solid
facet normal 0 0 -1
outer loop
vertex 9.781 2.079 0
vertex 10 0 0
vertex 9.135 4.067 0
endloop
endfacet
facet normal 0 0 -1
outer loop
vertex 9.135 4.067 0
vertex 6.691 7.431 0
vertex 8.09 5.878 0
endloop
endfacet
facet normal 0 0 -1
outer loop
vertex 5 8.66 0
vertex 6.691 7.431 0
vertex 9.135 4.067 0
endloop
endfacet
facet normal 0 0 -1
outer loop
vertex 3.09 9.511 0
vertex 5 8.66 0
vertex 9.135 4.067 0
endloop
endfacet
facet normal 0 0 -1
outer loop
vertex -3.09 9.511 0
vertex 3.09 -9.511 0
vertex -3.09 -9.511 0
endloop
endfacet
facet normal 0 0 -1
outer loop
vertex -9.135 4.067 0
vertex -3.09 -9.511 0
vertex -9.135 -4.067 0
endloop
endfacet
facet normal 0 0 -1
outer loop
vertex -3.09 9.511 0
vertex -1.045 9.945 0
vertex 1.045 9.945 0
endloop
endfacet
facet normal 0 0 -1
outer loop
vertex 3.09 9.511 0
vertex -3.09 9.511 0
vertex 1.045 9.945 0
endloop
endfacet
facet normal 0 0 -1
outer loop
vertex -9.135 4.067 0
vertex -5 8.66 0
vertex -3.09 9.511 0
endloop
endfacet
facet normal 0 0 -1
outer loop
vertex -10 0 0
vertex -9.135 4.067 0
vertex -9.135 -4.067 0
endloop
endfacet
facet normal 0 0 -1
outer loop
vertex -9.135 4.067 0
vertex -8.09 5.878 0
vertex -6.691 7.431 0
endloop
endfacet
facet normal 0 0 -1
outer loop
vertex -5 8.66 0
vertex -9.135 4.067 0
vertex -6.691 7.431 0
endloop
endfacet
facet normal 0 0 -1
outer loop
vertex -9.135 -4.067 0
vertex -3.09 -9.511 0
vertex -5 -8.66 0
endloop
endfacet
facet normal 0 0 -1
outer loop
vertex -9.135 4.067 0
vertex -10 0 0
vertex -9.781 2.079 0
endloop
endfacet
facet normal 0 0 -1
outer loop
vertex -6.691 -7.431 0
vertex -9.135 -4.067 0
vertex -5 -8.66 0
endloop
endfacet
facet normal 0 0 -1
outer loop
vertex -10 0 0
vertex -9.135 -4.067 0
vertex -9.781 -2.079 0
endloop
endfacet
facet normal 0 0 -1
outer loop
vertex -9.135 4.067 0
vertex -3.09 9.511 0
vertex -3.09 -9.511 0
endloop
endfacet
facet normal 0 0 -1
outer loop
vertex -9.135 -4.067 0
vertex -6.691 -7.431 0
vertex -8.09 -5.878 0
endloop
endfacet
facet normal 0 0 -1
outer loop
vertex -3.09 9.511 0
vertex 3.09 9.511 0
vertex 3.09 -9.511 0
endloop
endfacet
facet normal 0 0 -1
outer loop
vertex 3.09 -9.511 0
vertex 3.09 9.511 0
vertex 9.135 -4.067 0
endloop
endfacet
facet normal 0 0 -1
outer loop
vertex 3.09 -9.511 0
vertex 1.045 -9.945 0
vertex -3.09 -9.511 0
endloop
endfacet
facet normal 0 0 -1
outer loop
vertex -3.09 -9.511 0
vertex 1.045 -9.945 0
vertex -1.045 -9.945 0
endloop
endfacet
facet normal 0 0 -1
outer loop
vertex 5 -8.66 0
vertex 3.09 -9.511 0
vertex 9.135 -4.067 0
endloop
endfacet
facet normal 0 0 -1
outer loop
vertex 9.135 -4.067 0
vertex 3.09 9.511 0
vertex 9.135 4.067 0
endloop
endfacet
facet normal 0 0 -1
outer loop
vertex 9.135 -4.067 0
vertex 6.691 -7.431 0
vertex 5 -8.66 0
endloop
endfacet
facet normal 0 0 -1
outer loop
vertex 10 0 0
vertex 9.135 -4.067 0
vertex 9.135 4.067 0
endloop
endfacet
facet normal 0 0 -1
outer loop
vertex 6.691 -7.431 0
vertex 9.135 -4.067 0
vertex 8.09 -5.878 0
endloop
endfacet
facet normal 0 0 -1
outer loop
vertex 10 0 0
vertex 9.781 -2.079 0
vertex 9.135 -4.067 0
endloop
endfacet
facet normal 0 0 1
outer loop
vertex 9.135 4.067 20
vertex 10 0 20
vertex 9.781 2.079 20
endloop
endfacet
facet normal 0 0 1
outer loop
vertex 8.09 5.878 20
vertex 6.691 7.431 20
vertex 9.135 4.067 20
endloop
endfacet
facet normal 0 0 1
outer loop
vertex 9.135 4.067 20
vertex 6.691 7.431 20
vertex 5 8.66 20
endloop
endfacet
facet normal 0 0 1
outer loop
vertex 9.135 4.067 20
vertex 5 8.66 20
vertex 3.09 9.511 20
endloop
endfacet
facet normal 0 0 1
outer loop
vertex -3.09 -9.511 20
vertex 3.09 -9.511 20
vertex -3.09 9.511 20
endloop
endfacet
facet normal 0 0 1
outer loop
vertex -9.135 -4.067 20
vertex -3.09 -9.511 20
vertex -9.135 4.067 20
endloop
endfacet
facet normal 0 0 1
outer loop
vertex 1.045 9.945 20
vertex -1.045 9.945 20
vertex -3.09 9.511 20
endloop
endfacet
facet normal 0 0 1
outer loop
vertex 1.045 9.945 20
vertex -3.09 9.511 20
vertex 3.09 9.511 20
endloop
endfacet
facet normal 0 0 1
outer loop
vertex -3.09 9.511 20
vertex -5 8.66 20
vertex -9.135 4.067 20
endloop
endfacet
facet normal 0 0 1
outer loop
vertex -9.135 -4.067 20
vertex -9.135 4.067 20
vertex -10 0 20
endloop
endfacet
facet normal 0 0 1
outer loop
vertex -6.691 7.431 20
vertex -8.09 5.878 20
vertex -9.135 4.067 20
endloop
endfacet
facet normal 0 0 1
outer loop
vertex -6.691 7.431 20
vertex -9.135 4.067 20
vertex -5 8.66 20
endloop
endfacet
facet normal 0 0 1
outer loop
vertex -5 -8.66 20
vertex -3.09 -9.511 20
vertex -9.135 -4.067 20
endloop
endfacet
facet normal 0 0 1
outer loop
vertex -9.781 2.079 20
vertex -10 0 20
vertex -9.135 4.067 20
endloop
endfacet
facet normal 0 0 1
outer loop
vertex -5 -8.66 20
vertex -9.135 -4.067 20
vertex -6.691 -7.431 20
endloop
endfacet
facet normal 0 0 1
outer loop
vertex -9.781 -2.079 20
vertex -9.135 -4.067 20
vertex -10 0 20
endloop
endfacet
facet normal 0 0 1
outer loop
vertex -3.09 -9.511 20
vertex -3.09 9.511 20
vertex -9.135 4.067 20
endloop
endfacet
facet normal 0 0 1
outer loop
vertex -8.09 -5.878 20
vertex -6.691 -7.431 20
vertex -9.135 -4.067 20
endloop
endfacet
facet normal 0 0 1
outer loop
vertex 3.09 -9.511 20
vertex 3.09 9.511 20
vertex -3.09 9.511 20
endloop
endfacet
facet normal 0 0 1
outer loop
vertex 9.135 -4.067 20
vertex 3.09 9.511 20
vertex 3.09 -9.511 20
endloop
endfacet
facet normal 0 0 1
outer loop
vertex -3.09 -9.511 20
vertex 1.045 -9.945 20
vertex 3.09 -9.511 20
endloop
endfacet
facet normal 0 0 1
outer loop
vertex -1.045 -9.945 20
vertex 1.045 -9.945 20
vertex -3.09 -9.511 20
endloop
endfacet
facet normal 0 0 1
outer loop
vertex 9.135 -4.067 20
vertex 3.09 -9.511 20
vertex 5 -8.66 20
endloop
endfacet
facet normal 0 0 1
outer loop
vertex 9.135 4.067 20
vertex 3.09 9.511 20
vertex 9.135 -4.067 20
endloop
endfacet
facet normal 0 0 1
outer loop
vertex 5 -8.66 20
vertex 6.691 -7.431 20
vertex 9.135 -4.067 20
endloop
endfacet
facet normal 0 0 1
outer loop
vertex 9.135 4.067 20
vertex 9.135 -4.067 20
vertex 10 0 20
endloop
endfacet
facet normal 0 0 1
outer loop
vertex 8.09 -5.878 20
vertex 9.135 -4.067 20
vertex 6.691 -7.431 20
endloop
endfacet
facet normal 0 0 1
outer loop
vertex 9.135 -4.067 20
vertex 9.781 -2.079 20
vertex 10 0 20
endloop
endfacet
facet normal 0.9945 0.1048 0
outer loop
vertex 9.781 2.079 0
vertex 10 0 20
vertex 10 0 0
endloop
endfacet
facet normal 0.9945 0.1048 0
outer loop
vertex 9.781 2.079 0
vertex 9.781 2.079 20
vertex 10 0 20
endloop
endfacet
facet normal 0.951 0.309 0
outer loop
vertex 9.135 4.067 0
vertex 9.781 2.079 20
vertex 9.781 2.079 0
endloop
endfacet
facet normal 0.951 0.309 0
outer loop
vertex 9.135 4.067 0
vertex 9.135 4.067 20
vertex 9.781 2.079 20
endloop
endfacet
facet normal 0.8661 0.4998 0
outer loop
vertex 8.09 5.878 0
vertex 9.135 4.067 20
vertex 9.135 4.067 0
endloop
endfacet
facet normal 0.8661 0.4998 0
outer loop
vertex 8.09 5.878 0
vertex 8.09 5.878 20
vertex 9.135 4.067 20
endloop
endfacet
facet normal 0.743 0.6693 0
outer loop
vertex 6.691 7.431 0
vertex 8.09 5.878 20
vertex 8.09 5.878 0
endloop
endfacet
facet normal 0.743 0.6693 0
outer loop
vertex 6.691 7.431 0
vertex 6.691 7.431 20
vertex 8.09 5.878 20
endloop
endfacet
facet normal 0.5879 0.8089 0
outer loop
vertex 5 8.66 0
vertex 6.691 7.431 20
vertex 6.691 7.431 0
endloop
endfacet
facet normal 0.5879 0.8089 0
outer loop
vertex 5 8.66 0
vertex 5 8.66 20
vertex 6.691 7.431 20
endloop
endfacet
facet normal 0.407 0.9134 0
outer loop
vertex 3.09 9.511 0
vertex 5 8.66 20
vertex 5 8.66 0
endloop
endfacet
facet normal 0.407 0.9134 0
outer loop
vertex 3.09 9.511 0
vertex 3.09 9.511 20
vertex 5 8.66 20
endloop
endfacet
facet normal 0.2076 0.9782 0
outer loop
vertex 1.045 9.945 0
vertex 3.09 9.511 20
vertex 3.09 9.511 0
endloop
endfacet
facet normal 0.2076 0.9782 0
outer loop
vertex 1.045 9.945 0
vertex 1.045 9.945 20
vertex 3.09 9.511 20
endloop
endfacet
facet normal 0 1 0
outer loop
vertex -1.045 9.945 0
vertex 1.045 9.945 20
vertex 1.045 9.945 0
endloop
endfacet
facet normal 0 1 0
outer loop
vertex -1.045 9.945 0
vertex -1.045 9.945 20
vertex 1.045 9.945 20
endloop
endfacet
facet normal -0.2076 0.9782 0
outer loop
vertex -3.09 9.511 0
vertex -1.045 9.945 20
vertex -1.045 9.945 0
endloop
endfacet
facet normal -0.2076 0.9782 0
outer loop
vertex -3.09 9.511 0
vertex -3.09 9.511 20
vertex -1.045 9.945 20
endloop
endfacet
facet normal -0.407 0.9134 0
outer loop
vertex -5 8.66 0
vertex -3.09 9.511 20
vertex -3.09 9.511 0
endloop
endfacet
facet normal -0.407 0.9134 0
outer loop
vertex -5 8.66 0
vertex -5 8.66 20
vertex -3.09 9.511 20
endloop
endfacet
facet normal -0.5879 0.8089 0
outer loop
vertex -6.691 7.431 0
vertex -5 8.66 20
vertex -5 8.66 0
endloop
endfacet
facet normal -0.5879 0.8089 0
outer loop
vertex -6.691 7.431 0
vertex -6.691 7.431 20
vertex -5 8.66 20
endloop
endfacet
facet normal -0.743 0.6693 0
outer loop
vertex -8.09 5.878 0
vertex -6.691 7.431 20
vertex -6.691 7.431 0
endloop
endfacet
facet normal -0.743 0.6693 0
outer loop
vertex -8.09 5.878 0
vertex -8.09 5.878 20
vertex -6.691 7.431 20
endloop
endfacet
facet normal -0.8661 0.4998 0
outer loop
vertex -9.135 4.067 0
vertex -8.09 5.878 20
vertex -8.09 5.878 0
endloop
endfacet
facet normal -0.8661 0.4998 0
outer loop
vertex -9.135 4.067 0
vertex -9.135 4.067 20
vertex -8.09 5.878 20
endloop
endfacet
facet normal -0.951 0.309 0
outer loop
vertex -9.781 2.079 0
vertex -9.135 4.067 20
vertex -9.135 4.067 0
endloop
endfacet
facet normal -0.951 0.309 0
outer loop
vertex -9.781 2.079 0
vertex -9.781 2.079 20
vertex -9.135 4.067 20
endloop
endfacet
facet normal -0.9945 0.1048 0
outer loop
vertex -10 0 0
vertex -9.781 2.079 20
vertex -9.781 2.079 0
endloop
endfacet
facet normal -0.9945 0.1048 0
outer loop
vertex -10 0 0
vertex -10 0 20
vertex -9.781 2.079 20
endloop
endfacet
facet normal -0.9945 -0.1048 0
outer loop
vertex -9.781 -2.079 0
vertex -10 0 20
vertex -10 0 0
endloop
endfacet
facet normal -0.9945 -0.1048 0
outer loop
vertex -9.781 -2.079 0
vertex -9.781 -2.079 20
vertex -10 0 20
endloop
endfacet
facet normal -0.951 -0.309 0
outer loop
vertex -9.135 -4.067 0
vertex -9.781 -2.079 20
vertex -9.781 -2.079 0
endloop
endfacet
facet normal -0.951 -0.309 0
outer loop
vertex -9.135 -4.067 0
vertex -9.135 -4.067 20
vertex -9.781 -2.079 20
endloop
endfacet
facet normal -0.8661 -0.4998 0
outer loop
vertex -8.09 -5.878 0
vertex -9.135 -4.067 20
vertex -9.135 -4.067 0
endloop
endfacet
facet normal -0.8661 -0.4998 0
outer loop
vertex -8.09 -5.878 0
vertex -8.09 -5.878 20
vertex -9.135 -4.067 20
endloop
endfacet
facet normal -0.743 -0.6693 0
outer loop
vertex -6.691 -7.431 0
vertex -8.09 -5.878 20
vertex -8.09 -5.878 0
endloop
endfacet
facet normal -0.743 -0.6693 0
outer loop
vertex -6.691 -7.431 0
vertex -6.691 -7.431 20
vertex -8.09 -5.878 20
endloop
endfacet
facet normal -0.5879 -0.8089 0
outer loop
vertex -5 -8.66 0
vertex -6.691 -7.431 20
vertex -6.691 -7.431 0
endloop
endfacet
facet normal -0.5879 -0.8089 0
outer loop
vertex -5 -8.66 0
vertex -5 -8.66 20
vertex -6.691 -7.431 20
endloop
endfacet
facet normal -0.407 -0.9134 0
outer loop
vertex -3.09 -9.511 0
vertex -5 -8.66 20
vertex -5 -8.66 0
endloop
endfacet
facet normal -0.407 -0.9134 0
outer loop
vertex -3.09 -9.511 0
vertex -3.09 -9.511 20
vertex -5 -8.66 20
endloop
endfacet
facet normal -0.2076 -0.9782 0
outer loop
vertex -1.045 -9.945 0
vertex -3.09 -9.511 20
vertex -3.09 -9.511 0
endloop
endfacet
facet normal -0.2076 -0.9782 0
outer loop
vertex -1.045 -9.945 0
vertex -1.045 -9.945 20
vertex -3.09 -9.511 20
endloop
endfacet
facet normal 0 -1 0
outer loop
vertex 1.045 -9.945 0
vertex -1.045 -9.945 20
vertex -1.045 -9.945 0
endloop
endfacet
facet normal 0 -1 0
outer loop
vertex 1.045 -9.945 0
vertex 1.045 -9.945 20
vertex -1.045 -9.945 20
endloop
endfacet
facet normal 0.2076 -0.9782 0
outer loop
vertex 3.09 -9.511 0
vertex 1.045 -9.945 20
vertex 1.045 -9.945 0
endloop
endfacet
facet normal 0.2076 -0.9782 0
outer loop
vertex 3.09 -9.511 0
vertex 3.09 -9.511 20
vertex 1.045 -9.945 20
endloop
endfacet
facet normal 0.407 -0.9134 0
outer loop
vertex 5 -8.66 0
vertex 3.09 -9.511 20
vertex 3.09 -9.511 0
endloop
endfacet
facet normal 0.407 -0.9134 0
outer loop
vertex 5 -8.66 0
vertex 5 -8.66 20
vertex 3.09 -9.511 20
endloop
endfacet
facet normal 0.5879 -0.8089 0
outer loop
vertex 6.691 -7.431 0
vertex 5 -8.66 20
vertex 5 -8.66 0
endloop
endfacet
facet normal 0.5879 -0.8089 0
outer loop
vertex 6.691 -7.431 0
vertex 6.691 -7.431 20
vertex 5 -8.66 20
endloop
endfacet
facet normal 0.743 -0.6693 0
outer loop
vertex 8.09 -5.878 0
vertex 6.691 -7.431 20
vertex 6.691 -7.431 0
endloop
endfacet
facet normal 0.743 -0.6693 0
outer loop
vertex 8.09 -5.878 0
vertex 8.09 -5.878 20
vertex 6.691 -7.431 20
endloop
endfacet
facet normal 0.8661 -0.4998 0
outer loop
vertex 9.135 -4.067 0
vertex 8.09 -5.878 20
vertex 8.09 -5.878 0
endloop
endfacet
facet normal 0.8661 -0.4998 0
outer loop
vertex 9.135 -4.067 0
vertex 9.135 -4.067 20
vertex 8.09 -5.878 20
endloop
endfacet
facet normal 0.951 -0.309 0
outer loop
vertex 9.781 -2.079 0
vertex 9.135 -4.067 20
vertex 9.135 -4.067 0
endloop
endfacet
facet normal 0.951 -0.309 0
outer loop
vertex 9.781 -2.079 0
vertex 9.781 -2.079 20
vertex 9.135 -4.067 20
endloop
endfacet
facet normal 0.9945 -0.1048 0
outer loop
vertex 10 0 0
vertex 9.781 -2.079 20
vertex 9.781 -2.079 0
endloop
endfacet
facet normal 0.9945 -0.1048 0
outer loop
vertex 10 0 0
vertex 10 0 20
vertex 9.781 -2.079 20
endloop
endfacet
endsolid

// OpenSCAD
multmatrix(m = [[1, 0,  0,      0],
                [0, 1,  0,      0],
                [0, 0,  1,      0],
                [0, 0,  -0.02, 1]])
 linear_extrude(height=20) circle(r=10);
